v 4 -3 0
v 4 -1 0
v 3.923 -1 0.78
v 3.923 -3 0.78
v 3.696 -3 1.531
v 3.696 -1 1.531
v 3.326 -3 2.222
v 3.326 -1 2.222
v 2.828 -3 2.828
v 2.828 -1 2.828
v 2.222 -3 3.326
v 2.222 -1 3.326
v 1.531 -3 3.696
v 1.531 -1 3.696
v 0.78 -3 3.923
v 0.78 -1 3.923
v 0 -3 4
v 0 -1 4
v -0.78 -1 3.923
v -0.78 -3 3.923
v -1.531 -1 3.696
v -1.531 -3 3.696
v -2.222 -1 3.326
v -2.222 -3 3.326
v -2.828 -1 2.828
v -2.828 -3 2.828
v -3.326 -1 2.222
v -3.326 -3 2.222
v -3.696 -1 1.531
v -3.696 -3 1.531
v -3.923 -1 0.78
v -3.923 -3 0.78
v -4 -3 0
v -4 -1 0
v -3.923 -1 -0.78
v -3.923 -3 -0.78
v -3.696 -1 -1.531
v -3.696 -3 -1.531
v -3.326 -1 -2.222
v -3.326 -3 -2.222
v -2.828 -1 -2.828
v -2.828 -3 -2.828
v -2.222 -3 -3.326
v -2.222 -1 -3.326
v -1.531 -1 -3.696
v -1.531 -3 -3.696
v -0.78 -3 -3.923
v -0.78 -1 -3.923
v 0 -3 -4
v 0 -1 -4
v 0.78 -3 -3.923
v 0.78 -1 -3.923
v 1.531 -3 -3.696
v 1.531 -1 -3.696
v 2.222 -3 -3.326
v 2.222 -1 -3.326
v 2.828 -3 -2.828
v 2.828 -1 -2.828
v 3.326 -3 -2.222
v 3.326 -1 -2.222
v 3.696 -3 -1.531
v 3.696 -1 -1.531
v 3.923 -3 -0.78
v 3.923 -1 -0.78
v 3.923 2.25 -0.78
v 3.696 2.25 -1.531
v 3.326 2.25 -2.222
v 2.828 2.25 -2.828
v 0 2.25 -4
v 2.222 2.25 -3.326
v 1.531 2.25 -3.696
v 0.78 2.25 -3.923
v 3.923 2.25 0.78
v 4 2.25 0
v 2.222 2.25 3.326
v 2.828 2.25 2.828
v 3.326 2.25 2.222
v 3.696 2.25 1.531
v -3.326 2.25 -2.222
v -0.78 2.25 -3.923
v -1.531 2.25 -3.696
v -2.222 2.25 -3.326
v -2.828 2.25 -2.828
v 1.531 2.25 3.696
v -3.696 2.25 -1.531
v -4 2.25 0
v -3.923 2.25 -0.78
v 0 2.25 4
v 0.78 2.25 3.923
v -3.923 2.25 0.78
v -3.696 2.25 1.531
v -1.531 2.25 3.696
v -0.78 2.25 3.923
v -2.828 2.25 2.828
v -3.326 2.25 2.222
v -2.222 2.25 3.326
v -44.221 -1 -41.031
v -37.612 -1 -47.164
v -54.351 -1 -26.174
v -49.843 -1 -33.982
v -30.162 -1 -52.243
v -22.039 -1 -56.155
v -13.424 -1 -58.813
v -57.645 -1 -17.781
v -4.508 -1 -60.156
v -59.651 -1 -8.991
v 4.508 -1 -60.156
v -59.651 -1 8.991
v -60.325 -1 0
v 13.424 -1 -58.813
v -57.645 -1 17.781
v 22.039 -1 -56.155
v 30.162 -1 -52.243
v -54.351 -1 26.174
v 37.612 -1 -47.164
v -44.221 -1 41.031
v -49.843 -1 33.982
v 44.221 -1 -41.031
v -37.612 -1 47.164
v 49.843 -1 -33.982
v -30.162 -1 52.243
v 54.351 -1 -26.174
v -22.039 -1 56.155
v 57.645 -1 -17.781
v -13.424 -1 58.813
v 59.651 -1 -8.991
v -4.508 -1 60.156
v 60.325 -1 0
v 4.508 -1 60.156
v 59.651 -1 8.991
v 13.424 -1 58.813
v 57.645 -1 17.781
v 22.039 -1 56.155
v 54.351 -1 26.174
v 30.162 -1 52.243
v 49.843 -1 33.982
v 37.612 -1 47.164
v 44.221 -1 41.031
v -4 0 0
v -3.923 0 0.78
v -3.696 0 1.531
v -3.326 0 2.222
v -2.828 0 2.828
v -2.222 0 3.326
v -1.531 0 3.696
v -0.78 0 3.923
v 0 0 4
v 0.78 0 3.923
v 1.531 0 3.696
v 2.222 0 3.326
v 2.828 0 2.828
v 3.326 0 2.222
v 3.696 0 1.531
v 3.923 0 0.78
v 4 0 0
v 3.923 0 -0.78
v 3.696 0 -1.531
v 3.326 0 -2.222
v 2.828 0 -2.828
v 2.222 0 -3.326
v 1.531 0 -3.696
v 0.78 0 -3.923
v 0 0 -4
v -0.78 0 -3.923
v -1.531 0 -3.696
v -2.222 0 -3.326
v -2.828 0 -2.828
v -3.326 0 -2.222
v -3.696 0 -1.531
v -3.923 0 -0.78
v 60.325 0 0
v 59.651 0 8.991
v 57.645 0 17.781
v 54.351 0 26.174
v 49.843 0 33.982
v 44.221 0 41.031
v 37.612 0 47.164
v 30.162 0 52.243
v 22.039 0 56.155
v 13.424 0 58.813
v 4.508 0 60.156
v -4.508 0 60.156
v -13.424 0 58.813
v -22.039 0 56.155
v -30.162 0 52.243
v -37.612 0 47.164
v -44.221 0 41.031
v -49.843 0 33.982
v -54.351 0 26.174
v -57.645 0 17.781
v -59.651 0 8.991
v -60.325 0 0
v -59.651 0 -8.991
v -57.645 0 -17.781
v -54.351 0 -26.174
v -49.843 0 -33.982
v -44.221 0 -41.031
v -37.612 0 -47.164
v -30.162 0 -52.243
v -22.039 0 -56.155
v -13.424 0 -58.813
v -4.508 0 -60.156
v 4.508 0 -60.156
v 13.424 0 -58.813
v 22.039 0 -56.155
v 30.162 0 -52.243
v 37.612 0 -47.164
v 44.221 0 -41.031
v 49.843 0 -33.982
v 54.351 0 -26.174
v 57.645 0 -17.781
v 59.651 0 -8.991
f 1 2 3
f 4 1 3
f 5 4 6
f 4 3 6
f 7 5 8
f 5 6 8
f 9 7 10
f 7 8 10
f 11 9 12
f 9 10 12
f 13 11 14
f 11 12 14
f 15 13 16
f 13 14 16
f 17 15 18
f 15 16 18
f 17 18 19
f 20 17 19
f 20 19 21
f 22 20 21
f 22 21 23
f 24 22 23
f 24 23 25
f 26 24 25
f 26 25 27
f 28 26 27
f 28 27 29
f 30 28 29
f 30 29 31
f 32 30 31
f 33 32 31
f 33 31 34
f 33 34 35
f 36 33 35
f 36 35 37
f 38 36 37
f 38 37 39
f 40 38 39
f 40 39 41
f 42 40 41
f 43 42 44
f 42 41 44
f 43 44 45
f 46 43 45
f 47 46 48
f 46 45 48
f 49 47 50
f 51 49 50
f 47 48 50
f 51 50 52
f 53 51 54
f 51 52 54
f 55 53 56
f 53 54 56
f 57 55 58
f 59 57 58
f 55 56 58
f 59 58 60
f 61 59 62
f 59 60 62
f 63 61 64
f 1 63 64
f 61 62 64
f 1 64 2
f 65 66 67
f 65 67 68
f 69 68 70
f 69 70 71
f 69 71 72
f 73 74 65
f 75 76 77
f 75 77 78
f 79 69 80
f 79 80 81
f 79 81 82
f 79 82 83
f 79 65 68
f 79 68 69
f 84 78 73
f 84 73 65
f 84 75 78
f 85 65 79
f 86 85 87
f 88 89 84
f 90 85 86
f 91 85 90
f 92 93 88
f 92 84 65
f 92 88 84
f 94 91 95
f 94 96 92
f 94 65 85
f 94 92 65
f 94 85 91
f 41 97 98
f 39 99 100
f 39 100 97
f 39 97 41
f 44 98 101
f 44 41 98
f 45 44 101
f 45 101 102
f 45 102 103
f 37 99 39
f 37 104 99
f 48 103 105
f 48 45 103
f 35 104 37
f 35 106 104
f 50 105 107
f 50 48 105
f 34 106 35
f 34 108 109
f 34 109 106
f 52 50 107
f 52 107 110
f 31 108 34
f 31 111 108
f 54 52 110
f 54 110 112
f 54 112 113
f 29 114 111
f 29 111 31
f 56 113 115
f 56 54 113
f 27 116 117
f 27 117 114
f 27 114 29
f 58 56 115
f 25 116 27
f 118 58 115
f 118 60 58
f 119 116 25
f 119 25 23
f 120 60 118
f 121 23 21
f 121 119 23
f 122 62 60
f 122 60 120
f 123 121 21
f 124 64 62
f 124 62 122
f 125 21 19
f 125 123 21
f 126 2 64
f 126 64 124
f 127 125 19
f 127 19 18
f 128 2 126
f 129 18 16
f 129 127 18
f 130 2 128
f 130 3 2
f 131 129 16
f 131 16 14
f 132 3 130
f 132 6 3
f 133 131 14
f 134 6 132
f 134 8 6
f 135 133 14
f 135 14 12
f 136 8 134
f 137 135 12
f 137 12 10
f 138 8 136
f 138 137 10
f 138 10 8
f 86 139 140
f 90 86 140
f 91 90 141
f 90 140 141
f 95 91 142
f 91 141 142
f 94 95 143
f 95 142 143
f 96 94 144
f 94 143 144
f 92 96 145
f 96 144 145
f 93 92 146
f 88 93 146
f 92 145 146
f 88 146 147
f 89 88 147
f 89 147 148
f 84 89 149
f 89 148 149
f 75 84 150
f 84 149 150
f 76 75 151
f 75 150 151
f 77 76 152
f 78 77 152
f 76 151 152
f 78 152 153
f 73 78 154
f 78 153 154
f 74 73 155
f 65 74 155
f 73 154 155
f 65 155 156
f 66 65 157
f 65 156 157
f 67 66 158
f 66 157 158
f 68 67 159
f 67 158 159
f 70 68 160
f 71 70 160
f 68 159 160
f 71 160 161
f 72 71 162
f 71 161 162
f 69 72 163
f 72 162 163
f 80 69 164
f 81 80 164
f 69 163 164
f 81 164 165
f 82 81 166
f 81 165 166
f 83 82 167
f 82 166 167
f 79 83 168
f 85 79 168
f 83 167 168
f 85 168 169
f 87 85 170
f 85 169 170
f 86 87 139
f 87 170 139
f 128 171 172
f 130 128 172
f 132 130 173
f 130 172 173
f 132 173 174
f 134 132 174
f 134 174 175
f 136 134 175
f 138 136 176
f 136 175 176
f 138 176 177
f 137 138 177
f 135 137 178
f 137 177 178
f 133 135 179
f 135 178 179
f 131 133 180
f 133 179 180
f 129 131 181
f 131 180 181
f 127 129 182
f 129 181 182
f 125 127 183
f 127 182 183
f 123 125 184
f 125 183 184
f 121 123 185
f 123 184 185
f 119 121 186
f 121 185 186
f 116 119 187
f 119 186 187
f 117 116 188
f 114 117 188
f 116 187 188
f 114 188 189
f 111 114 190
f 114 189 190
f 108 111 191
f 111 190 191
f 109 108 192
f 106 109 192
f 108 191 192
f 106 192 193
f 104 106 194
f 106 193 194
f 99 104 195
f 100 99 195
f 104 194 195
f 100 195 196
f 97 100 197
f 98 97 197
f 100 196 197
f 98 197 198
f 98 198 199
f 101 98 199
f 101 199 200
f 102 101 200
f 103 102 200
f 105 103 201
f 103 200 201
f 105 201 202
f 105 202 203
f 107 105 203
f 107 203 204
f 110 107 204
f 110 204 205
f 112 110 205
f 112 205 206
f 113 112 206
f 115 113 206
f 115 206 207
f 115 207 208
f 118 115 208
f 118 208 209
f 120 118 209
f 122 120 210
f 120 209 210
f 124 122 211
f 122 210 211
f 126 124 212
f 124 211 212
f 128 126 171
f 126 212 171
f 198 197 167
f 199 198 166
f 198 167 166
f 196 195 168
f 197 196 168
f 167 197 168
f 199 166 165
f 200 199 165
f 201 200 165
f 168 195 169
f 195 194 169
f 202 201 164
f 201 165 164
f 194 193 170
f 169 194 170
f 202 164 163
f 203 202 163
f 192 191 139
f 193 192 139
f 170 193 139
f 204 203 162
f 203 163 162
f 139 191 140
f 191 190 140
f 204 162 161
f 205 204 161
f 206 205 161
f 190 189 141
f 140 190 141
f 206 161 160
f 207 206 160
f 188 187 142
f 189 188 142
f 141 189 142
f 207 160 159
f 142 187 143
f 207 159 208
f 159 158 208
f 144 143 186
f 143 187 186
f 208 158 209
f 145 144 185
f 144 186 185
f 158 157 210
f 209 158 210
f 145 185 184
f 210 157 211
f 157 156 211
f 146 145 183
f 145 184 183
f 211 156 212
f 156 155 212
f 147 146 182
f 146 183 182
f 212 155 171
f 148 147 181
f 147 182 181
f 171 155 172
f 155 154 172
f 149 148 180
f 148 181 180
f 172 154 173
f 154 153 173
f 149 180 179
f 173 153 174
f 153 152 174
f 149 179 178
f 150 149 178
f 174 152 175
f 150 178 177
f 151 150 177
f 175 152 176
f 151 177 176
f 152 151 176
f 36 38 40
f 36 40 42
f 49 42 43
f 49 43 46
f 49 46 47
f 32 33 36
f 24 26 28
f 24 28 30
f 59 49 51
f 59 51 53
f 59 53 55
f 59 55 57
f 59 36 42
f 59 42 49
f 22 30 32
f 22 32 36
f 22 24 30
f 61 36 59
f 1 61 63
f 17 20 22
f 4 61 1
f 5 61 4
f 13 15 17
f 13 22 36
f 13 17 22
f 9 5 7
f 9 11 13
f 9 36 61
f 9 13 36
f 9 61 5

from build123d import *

# Parameters (mm, degrees)
F1_R     = 4
F2_DEPTH = 3
F0_R     = 60.325
F3_DEPTH = 1
F4_R     = 4
F5_DEPTH = 2.25


with BuildPart() as f2:
    # F1 (on face) → F2 (new body)
    with BuildSketch(Plane.XZ):
        Circle(F1_R)
    extrude(amount=F2_DEPTH)

    # F0 (on Front) → F3 (join)
    with BuildSketch(Plane.XZ):
        Circle(F0_R)
    extrude(amount=F3_DEPTH)

    # F4 (on face) → F5 (join)
    with BuildSketch(Plane(origin=(0, 0, 0), x_dir=(-1, 0, 0), z_dir=(0, 1, 0))):
        Circle(F4_R)
    extrude(amount=F5_DEPTH)


solid = f2.part
